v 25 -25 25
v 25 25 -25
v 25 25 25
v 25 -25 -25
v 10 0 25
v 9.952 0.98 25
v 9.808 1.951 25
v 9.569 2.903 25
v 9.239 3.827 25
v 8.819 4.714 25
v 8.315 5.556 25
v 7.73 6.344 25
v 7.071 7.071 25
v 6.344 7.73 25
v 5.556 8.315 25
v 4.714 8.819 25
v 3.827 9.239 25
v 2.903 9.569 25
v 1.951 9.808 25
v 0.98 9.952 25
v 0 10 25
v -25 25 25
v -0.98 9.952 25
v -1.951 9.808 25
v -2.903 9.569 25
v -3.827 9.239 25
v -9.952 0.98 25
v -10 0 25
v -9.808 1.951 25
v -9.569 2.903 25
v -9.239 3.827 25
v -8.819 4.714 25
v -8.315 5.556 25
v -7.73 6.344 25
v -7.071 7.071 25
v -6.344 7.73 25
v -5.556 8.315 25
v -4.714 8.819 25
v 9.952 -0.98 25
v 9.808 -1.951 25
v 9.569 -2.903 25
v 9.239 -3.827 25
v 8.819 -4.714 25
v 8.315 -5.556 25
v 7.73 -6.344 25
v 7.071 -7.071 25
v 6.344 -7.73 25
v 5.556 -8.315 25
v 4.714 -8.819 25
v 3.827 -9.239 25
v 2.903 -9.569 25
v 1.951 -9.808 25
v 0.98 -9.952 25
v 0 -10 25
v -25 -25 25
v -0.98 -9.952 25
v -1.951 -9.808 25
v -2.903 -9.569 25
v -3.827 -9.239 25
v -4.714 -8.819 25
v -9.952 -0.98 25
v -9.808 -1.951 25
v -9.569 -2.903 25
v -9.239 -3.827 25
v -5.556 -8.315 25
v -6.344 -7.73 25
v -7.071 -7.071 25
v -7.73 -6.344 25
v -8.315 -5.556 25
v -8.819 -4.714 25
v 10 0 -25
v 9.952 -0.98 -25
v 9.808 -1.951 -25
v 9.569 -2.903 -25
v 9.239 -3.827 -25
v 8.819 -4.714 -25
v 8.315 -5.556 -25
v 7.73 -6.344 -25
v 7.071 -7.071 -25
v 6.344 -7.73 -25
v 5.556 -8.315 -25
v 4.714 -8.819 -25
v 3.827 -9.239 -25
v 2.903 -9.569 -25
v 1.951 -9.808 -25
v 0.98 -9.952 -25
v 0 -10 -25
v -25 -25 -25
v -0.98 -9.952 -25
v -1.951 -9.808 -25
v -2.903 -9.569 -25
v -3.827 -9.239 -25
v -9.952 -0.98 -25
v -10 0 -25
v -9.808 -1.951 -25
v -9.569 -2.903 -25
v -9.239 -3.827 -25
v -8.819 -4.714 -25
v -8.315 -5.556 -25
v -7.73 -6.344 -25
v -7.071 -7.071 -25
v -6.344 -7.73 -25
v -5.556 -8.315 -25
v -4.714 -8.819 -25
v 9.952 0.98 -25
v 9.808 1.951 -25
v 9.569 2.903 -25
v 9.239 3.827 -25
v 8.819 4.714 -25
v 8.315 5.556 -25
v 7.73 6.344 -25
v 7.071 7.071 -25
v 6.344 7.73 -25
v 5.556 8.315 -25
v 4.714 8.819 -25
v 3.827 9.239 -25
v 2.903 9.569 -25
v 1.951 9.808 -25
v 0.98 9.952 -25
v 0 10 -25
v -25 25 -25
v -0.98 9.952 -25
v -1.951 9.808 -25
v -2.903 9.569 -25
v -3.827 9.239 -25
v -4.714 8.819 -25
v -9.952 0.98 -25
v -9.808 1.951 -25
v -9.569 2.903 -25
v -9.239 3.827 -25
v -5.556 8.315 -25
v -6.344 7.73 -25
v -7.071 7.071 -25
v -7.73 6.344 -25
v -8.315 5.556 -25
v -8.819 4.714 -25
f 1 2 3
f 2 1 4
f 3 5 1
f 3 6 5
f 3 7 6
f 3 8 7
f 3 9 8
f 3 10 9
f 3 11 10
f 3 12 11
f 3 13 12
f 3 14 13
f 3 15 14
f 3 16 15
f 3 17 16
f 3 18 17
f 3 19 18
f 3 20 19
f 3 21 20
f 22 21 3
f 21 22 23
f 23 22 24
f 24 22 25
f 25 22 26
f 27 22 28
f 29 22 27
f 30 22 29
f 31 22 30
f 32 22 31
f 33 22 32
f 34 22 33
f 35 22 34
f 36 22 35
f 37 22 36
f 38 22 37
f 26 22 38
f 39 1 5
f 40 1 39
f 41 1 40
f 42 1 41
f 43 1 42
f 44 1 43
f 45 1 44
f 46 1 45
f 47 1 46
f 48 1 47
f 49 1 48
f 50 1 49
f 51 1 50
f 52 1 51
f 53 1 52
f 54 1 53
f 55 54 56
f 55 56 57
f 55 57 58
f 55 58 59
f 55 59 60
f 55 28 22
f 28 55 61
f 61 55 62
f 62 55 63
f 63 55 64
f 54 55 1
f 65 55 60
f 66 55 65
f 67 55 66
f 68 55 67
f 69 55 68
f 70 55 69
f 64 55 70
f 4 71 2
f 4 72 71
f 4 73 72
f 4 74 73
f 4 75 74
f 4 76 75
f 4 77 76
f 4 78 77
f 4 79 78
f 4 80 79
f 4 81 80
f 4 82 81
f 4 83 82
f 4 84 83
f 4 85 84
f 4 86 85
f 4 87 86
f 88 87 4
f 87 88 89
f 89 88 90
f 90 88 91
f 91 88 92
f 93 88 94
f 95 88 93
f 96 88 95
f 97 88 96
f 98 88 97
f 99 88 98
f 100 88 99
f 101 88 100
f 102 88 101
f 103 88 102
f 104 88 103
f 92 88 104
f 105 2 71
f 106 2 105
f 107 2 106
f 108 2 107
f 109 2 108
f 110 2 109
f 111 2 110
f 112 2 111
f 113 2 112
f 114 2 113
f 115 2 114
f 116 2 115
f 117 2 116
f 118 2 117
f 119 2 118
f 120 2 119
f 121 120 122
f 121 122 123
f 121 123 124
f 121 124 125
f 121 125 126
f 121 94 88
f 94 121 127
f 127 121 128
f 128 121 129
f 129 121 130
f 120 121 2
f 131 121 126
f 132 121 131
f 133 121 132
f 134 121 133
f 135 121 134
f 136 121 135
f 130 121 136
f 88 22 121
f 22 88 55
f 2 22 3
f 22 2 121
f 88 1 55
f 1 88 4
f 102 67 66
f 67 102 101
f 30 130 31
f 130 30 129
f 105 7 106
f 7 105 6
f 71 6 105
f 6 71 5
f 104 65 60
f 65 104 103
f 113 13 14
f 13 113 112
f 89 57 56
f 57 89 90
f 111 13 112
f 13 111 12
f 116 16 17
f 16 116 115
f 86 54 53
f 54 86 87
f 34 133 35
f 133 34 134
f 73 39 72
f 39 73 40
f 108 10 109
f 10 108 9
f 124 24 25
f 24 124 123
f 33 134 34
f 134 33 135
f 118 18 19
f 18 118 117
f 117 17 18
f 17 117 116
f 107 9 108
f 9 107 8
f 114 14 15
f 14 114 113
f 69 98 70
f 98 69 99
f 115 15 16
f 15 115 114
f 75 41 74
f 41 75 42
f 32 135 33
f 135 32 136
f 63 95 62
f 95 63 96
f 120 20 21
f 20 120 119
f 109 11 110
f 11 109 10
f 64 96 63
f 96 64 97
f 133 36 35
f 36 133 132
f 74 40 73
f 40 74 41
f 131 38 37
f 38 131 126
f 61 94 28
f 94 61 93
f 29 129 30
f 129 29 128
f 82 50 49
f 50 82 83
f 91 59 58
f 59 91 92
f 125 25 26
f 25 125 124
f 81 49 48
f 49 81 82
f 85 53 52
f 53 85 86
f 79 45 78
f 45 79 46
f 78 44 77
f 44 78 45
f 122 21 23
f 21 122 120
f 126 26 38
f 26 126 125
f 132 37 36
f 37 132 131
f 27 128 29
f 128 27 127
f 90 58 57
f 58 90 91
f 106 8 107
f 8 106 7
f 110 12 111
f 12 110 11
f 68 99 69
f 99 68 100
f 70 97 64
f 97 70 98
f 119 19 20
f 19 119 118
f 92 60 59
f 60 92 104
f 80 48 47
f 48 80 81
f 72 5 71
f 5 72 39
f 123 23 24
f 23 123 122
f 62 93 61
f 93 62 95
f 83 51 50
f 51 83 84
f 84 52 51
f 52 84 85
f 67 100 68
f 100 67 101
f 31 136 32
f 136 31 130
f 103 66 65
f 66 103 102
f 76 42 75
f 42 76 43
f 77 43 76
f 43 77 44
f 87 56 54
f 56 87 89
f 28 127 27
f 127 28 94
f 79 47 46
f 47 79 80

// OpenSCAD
difference() {
    cube([50, 50, 50], center = true);
    cylinder(h = 60, d = 20, center = true, $fn = 64);
}
